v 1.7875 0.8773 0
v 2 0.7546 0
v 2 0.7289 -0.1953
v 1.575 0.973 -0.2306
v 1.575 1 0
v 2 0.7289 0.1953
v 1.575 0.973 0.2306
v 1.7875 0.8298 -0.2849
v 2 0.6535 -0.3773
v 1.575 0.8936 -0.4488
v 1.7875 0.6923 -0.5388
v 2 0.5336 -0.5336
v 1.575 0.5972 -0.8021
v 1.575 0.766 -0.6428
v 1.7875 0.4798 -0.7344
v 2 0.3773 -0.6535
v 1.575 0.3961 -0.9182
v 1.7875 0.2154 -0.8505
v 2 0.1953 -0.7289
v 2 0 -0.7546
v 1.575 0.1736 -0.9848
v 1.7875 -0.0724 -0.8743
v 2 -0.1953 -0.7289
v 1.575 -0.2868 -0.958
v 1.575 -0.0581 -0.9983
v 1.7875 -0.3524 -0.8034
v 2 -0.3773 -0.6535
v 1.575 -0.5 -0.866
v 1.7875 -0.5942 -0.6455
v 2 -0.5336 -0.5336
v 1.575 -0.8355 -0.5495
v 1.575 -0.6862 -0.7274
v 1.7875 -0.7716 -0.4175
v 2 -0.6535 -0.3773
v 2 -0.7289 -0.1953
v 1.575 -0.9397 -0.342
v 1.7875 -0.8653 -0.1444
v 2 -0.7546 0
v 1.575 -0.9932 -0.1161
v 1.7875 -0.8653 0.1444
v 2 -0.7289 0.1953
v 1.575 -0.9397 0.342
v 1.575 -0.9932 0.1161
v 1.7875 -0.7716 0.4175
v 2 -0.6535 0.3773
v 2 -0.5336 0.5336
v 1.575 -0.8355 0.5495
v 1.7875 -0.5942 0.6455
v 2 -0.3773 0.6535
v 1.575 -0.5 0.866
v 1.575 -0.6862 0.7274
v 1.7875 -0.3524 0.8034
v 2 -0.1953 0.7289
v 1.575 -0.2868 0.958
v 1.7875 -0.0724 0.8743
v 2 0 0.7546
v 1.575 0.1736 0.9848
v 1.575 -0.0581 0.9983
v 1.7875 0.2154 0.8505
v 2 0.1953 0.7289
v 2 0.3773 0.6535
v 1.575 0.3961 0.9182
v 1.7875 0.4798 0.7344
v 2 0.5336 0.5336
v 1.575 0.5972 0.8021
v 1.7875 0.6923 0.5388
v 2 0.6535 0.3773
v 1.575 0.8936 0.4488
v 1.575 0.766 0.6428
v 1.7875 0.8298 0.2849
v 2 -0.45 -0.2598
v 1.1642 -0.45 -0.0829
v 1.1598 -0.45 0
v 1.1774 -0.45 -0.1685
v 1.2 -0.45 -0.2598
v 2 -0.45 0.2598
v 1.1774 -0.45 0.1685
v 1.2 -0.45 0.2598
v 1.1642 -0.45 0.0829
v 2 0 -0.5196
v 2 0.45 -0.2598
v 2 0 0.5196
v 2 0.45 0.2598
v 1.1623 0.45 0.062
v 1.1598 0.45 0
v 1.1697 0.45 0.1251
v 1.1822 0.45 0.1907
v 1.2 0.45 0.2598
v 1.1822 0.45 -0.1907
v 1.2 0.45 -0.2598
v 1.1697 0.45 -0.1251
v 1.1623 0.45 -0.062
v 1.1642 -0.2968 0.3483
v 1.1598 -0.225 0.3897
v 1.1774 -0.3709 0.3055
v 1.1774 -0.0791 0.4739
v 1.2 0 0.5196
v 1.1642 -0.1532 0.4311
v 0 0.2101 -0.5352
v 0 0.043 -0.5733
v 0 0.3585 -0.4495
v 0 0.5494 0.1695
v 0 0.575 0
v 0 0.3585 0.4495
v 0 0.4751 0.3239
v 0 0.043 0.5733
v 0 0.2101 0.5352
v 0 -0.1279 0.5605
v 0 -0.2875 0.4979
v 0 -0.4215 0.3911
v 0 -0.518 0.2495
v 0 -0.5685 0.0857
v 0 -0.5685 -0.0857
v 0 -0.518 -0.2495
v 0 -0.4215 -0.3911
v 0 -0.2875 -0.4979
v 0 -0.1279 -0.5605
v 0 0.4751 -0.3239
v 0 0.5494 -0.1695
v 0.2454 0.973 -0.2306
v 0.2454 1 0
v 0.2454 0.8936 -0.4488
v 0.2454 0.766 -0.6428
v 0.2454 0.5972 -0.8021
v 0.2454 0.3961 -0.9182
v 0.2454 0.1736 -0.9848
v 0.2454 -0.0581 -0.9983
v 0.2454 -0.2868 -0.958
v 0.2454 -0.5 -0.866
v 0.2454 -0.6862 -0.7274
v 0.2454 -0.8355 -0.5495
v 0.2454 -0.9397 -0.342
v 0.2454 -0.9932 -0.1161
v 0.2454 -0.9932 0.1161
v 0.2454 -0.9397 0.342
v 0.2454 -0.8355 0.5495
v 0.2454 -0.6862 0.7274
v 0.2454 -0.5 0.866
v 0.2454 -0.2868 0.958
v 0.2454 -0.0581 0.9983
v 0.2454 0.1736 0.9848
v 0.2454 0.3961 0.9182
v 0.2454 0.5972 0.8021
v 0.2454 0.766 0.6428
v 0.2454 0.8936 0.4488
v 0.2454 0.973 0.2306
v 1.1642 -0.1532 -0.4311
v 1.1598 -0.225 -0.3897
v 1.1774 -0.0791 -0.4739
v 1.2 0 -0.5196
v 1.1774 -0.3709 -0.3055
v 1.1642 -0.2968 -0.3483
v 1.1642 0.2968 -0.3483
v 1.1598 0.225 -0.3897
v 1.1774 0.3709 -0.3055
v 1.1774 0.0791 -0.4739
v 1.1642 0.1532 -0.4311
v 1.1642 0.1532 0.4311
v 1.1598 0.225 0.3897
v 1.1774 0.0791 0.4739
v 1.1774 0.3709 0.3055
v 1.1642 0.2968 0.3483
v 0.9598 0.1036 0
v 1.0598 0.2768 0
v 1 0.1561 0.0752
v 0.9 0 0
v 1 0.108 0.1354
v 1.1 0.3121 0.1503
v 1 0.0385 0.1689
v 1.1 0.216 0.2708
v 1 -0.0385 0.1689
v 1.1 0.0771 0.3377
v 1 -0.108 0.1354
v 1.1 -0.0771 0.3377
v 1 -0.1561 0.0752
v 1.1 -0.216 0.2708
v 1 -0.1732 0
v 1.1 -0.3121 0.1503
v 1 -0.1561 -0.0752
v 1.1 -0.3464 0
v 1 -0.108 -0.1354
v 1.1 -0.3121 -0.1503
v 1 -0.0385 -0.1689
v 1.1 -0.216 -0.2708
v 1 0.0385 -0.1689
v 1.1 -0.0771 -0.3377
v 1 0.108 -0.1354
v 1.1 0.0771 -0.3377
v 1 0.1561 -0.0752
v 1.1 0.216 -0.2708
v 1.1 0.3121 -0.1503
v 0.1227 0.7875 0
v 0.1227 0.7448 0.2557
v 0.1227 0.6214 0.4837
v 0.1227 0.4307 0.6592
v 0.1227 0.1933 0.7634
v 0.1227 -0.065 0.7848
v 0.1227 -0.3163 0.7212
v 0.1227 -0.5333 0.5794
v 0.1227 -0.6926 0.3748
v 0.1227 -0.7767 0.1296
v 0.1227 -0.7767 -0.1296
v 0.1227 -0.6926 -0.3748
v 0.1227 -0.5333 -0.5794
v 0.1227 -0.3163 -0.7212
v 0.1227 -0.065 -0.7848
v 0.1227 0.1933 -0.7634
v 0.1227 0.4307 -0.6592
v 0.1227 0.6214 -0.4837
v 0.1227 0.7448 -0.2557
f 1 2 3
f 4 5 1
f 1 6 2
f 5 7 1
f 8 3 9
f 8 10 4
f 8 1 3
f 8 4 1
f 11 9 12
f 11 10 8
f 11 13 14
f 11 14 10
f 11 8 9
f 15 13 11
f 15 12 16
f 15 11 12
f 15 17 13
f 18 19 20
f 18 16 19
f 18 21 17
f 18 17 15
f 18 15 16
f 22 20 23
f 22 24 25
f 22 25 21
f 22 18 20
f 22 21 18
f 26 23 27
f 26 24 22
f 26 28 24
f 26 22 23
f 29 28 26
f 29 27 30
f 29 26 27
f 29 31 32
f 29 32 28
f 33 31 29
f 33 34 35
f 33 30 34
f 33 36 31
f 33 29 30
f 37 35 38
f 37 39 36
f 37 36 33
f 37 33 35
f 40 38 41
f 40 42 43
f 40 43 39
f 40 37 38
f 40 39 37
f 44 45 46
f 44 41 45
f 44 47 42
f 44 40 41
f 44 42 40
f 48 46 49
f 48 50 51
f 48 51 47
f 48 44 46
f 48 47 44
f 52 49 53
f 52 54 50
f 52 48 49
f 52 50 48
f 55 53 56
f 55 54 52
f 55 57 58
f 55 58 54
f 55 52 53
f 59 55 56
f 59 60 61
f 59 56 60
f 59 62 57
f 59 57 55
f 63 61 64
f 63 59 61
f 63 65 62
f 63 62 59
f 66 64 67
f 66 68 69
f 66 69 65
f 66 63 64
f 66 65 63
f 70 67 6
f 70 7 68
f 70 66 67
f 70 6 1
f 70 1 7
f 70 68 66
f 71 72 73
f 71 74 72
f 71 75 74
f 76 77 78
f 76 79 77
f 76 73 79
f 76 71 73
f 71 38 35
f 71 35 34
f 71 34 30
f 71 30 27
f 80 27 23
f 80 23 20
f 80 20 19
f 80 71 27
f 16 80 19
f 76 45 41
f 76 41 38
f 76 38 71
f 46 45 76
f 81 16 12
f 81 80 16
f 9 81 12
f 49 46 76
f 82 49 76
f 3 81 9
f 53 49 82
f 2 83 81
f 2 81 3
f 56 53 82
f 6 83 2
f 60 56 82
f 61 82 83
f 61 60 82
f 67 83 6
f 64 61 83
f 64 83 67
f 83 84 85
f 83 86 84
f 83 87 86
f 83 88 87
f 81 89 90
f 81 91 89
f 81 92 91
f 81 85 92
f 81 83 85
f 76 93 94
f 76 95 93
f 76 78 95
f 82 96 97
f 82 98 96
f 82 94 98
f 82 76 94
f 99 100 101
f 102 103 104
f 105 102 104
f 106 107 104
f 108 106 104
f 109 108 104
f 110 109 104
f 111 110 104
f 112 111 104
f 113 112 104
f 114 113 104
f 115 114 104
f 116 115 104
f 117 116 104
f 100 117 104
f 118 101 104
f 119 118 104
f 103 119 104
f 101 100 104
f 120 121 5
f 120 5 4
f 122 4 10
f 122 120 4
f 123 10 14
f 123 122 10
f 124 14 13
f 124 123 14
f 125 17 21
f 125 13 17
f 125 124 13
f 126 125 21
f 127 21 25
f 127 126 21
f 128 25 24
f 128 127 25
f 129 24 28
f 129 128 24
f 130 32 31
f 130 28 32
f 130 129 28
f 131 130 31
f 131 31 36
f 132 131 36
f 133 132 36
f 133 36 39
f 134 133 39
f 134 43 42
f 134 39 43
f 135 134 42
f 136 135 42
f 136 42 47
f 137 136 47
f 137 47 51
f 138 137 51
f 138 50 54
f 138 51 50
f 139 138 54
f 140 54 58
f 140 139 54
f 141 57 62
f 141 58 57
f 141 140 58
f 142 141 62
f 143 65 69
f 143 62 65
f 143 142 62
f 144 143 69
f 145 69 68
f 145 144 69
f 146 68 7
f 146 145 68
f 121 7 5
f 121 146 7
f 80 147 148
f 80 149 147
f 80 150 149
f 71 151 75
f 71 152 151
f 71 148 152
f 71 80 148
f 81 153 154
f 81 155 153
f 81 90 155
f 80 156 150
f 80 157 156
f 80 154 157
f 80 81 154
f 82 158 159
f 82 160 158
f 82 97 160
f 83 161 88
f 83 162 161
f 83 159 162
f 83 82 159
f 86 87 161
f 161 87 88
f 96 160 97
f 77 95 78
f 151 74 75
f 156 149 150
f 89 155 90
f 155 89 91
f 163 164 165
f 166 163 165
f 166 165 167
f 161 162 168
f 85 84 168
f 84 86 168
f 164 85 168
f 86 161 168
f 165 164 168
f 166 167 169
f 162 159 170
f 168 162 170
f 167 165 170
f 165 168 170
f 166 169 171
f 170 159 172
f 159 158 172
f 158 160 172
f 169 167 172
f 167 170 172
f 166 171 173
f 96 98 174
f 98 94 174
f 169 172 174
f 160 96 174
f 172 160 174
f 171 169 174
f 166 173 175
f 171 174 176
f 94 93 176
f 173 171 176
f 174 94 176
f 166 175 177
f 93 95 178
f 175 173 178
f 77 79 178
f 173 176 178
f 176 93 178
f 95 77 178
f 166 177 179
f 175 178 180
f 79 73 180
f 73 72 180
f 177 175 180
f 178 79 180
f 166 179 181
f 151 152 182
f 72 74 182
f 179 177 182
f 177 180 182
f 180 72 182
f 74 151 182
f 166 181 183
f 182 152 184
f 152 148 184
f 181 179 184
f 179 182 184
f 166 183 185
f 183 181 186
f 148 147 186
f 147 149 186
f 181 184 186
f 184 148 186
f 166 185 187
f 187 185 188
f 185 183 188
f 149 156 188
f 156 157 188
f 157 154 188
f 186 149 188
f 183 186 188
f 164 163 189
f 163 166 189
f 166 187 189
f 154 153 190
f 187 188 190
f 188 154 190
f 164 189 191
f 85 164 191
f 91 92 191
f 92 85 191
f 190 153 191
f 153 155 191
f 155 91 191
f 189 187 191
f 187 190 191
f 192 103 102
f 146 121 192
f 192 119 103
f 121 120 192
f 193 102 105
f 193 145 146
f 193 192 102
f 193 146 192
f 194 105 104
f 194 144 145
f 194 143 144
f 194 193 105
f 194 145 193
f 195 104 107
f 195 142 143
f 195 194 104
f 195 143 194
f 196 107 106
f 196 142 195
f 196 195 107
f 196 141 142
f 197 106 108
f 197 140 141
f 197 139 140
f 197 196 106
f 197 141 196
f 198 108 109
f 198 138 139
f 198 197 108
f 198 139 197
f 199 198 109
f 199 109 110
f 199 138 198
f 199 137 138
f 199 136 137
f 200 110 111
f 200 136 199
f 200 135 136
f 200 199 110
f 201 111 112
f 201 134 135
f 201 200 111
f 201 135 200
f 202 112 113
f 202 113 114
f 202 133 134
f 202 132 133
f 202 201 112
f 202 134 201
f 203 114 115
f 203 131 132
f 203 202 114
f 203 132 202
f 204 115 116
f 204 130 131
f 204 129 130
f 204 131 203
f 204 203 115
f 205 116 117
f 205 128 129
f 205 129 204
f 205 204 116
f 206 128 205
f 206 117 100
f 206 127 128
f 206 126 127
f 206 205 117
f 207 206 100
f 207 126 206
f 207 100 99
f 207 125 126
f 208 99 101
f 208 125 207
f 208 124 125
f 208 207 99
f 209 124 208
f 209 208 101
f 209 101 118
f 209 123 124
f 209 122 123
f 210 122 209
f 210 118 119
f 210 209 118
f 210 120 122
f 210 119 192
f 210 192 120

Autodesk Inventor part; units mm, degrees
ref_plane "YZ Plane" through (0, 0, 0) normal (1, 0, 0) x (0, 1, 0)
ref_plane "XZ Plane" through (0, 0, 0) normal (0, 1, 0) x (-1, 0, 0)
sketch "Skizze1" plane through (0, 0, 0) normal (0, 0, 1) x (1, 0, 0)
  line L0 (0, 0) -> (0.9, 0)
  line L1 (2, 0.5196) -> (2, 1)
  line L2 (2, 1) -> (0, 1)
  line L3 (2, 0.5196) -> (1.2, 0.5196)
  line L4 (1.2, 0.5196) -> (0.9, 0)
  line L5 (0, -0.2) -> (0, 1.2) projected
  line L6 (0, 1) -> (0, 0)
  dimension "d0" = 0.8
  dimension "d1" = 60
  dimension "d2" = 2
  dimension "d3" = 1.0392
  dimension "d5" = 2
revolve "Körper" add sketch "Skizze1" angle 360 about axis through (0, 0, 0) along (1, 0, 0)
chamfer "Fase1" distance 0.2454 angle 60 1 edges at (2, -1, 0) measured on face at (2, 0.8252, -0.1212)
sketch "Skizze2" plane through (2, 0, 0) normal (1, 0, 0) x (0, 0, -1)
  circle A0 centre (0, 0) radius 0.5196 projected
  line L0 (-0.2598, 0.45) -> (0.2598, 0.45)
  line L1 (0.2598, 0.45) -> (0.5196, 0)
  line L2 (0.5196, 0) -> (0.2598, -0.45)
  line L3 (0.2598, -0.45) -> (-0.2598, -0.45)
  line L4 (-0.2598, -0.45) -> (-0.5196, 0)
  line L5 (-0.5196, 0) -> (-0.2598, 0.45)
extrude "Loch" add sketch "Skizze2" against normal up to next contours L1 A0 | A0 L2 | L0 A0 | A0 L3 | L5 A0 | A0 L4
thread "Gewinde" size "M2x0.4" class "6g" standard "ISO Metric profile" length 2
chamfer "Fase2" distance 0.2454 angle 60 1 edges at (0, -1, 0) measured on face at (0.525, 0.9871, -0.1604)
ref_plane "Work Plane1" through (1, 0, 0) normal (0, 0.5, 0.866) x (1, 0, 0)
equation "\"d0\" = INTI"
equation "\"d2\" = NND"
equation "\"d3\" = 1.1547 * SW"
equation "\"d5\" = NLG"
equation "\"d7\" = -0.5 * GD1 + 0.5 * NND"
equation "\"d8\" = FAWI"
equation "\"d29\" = -0.5 * GD1 + 0.5 * NND"
equation "\"d11\" = NLG"
equation "\"d13\" = -0.5 * GD1 + 0.5 * NND"
equation "\"d14\" = FAWI"
equation "\"d30\" = -0.5 * GD1 + 0.5 * NND"
equation "\"NND\" = 2"
equation "\"NLG\" = 2"
equation "\"INTI\" = 0.8"
equation "\"FAWI\" = 60deg"
equation "\"SW\" = 0.9"
equation "\"GD1\" = THREADDIA - 1.2269 * PTC"
equation "\"FAWI1\" = 45deg"
equation "\"GUL\" = 0.61345 * PTC"
equation "\"SPD\" = 1"
equation "\"TOA\" = 30deg"
equation "\"THREADDIA\" = 2"
equation "\"PTC\" = 0.4"
equation "\"GAL\" = 0.61345 * PTC"
equation "\"E0\" = 1.155 * SW"
properties part number "BS 4168 - M2 x 2" material "Steel, Mild"
